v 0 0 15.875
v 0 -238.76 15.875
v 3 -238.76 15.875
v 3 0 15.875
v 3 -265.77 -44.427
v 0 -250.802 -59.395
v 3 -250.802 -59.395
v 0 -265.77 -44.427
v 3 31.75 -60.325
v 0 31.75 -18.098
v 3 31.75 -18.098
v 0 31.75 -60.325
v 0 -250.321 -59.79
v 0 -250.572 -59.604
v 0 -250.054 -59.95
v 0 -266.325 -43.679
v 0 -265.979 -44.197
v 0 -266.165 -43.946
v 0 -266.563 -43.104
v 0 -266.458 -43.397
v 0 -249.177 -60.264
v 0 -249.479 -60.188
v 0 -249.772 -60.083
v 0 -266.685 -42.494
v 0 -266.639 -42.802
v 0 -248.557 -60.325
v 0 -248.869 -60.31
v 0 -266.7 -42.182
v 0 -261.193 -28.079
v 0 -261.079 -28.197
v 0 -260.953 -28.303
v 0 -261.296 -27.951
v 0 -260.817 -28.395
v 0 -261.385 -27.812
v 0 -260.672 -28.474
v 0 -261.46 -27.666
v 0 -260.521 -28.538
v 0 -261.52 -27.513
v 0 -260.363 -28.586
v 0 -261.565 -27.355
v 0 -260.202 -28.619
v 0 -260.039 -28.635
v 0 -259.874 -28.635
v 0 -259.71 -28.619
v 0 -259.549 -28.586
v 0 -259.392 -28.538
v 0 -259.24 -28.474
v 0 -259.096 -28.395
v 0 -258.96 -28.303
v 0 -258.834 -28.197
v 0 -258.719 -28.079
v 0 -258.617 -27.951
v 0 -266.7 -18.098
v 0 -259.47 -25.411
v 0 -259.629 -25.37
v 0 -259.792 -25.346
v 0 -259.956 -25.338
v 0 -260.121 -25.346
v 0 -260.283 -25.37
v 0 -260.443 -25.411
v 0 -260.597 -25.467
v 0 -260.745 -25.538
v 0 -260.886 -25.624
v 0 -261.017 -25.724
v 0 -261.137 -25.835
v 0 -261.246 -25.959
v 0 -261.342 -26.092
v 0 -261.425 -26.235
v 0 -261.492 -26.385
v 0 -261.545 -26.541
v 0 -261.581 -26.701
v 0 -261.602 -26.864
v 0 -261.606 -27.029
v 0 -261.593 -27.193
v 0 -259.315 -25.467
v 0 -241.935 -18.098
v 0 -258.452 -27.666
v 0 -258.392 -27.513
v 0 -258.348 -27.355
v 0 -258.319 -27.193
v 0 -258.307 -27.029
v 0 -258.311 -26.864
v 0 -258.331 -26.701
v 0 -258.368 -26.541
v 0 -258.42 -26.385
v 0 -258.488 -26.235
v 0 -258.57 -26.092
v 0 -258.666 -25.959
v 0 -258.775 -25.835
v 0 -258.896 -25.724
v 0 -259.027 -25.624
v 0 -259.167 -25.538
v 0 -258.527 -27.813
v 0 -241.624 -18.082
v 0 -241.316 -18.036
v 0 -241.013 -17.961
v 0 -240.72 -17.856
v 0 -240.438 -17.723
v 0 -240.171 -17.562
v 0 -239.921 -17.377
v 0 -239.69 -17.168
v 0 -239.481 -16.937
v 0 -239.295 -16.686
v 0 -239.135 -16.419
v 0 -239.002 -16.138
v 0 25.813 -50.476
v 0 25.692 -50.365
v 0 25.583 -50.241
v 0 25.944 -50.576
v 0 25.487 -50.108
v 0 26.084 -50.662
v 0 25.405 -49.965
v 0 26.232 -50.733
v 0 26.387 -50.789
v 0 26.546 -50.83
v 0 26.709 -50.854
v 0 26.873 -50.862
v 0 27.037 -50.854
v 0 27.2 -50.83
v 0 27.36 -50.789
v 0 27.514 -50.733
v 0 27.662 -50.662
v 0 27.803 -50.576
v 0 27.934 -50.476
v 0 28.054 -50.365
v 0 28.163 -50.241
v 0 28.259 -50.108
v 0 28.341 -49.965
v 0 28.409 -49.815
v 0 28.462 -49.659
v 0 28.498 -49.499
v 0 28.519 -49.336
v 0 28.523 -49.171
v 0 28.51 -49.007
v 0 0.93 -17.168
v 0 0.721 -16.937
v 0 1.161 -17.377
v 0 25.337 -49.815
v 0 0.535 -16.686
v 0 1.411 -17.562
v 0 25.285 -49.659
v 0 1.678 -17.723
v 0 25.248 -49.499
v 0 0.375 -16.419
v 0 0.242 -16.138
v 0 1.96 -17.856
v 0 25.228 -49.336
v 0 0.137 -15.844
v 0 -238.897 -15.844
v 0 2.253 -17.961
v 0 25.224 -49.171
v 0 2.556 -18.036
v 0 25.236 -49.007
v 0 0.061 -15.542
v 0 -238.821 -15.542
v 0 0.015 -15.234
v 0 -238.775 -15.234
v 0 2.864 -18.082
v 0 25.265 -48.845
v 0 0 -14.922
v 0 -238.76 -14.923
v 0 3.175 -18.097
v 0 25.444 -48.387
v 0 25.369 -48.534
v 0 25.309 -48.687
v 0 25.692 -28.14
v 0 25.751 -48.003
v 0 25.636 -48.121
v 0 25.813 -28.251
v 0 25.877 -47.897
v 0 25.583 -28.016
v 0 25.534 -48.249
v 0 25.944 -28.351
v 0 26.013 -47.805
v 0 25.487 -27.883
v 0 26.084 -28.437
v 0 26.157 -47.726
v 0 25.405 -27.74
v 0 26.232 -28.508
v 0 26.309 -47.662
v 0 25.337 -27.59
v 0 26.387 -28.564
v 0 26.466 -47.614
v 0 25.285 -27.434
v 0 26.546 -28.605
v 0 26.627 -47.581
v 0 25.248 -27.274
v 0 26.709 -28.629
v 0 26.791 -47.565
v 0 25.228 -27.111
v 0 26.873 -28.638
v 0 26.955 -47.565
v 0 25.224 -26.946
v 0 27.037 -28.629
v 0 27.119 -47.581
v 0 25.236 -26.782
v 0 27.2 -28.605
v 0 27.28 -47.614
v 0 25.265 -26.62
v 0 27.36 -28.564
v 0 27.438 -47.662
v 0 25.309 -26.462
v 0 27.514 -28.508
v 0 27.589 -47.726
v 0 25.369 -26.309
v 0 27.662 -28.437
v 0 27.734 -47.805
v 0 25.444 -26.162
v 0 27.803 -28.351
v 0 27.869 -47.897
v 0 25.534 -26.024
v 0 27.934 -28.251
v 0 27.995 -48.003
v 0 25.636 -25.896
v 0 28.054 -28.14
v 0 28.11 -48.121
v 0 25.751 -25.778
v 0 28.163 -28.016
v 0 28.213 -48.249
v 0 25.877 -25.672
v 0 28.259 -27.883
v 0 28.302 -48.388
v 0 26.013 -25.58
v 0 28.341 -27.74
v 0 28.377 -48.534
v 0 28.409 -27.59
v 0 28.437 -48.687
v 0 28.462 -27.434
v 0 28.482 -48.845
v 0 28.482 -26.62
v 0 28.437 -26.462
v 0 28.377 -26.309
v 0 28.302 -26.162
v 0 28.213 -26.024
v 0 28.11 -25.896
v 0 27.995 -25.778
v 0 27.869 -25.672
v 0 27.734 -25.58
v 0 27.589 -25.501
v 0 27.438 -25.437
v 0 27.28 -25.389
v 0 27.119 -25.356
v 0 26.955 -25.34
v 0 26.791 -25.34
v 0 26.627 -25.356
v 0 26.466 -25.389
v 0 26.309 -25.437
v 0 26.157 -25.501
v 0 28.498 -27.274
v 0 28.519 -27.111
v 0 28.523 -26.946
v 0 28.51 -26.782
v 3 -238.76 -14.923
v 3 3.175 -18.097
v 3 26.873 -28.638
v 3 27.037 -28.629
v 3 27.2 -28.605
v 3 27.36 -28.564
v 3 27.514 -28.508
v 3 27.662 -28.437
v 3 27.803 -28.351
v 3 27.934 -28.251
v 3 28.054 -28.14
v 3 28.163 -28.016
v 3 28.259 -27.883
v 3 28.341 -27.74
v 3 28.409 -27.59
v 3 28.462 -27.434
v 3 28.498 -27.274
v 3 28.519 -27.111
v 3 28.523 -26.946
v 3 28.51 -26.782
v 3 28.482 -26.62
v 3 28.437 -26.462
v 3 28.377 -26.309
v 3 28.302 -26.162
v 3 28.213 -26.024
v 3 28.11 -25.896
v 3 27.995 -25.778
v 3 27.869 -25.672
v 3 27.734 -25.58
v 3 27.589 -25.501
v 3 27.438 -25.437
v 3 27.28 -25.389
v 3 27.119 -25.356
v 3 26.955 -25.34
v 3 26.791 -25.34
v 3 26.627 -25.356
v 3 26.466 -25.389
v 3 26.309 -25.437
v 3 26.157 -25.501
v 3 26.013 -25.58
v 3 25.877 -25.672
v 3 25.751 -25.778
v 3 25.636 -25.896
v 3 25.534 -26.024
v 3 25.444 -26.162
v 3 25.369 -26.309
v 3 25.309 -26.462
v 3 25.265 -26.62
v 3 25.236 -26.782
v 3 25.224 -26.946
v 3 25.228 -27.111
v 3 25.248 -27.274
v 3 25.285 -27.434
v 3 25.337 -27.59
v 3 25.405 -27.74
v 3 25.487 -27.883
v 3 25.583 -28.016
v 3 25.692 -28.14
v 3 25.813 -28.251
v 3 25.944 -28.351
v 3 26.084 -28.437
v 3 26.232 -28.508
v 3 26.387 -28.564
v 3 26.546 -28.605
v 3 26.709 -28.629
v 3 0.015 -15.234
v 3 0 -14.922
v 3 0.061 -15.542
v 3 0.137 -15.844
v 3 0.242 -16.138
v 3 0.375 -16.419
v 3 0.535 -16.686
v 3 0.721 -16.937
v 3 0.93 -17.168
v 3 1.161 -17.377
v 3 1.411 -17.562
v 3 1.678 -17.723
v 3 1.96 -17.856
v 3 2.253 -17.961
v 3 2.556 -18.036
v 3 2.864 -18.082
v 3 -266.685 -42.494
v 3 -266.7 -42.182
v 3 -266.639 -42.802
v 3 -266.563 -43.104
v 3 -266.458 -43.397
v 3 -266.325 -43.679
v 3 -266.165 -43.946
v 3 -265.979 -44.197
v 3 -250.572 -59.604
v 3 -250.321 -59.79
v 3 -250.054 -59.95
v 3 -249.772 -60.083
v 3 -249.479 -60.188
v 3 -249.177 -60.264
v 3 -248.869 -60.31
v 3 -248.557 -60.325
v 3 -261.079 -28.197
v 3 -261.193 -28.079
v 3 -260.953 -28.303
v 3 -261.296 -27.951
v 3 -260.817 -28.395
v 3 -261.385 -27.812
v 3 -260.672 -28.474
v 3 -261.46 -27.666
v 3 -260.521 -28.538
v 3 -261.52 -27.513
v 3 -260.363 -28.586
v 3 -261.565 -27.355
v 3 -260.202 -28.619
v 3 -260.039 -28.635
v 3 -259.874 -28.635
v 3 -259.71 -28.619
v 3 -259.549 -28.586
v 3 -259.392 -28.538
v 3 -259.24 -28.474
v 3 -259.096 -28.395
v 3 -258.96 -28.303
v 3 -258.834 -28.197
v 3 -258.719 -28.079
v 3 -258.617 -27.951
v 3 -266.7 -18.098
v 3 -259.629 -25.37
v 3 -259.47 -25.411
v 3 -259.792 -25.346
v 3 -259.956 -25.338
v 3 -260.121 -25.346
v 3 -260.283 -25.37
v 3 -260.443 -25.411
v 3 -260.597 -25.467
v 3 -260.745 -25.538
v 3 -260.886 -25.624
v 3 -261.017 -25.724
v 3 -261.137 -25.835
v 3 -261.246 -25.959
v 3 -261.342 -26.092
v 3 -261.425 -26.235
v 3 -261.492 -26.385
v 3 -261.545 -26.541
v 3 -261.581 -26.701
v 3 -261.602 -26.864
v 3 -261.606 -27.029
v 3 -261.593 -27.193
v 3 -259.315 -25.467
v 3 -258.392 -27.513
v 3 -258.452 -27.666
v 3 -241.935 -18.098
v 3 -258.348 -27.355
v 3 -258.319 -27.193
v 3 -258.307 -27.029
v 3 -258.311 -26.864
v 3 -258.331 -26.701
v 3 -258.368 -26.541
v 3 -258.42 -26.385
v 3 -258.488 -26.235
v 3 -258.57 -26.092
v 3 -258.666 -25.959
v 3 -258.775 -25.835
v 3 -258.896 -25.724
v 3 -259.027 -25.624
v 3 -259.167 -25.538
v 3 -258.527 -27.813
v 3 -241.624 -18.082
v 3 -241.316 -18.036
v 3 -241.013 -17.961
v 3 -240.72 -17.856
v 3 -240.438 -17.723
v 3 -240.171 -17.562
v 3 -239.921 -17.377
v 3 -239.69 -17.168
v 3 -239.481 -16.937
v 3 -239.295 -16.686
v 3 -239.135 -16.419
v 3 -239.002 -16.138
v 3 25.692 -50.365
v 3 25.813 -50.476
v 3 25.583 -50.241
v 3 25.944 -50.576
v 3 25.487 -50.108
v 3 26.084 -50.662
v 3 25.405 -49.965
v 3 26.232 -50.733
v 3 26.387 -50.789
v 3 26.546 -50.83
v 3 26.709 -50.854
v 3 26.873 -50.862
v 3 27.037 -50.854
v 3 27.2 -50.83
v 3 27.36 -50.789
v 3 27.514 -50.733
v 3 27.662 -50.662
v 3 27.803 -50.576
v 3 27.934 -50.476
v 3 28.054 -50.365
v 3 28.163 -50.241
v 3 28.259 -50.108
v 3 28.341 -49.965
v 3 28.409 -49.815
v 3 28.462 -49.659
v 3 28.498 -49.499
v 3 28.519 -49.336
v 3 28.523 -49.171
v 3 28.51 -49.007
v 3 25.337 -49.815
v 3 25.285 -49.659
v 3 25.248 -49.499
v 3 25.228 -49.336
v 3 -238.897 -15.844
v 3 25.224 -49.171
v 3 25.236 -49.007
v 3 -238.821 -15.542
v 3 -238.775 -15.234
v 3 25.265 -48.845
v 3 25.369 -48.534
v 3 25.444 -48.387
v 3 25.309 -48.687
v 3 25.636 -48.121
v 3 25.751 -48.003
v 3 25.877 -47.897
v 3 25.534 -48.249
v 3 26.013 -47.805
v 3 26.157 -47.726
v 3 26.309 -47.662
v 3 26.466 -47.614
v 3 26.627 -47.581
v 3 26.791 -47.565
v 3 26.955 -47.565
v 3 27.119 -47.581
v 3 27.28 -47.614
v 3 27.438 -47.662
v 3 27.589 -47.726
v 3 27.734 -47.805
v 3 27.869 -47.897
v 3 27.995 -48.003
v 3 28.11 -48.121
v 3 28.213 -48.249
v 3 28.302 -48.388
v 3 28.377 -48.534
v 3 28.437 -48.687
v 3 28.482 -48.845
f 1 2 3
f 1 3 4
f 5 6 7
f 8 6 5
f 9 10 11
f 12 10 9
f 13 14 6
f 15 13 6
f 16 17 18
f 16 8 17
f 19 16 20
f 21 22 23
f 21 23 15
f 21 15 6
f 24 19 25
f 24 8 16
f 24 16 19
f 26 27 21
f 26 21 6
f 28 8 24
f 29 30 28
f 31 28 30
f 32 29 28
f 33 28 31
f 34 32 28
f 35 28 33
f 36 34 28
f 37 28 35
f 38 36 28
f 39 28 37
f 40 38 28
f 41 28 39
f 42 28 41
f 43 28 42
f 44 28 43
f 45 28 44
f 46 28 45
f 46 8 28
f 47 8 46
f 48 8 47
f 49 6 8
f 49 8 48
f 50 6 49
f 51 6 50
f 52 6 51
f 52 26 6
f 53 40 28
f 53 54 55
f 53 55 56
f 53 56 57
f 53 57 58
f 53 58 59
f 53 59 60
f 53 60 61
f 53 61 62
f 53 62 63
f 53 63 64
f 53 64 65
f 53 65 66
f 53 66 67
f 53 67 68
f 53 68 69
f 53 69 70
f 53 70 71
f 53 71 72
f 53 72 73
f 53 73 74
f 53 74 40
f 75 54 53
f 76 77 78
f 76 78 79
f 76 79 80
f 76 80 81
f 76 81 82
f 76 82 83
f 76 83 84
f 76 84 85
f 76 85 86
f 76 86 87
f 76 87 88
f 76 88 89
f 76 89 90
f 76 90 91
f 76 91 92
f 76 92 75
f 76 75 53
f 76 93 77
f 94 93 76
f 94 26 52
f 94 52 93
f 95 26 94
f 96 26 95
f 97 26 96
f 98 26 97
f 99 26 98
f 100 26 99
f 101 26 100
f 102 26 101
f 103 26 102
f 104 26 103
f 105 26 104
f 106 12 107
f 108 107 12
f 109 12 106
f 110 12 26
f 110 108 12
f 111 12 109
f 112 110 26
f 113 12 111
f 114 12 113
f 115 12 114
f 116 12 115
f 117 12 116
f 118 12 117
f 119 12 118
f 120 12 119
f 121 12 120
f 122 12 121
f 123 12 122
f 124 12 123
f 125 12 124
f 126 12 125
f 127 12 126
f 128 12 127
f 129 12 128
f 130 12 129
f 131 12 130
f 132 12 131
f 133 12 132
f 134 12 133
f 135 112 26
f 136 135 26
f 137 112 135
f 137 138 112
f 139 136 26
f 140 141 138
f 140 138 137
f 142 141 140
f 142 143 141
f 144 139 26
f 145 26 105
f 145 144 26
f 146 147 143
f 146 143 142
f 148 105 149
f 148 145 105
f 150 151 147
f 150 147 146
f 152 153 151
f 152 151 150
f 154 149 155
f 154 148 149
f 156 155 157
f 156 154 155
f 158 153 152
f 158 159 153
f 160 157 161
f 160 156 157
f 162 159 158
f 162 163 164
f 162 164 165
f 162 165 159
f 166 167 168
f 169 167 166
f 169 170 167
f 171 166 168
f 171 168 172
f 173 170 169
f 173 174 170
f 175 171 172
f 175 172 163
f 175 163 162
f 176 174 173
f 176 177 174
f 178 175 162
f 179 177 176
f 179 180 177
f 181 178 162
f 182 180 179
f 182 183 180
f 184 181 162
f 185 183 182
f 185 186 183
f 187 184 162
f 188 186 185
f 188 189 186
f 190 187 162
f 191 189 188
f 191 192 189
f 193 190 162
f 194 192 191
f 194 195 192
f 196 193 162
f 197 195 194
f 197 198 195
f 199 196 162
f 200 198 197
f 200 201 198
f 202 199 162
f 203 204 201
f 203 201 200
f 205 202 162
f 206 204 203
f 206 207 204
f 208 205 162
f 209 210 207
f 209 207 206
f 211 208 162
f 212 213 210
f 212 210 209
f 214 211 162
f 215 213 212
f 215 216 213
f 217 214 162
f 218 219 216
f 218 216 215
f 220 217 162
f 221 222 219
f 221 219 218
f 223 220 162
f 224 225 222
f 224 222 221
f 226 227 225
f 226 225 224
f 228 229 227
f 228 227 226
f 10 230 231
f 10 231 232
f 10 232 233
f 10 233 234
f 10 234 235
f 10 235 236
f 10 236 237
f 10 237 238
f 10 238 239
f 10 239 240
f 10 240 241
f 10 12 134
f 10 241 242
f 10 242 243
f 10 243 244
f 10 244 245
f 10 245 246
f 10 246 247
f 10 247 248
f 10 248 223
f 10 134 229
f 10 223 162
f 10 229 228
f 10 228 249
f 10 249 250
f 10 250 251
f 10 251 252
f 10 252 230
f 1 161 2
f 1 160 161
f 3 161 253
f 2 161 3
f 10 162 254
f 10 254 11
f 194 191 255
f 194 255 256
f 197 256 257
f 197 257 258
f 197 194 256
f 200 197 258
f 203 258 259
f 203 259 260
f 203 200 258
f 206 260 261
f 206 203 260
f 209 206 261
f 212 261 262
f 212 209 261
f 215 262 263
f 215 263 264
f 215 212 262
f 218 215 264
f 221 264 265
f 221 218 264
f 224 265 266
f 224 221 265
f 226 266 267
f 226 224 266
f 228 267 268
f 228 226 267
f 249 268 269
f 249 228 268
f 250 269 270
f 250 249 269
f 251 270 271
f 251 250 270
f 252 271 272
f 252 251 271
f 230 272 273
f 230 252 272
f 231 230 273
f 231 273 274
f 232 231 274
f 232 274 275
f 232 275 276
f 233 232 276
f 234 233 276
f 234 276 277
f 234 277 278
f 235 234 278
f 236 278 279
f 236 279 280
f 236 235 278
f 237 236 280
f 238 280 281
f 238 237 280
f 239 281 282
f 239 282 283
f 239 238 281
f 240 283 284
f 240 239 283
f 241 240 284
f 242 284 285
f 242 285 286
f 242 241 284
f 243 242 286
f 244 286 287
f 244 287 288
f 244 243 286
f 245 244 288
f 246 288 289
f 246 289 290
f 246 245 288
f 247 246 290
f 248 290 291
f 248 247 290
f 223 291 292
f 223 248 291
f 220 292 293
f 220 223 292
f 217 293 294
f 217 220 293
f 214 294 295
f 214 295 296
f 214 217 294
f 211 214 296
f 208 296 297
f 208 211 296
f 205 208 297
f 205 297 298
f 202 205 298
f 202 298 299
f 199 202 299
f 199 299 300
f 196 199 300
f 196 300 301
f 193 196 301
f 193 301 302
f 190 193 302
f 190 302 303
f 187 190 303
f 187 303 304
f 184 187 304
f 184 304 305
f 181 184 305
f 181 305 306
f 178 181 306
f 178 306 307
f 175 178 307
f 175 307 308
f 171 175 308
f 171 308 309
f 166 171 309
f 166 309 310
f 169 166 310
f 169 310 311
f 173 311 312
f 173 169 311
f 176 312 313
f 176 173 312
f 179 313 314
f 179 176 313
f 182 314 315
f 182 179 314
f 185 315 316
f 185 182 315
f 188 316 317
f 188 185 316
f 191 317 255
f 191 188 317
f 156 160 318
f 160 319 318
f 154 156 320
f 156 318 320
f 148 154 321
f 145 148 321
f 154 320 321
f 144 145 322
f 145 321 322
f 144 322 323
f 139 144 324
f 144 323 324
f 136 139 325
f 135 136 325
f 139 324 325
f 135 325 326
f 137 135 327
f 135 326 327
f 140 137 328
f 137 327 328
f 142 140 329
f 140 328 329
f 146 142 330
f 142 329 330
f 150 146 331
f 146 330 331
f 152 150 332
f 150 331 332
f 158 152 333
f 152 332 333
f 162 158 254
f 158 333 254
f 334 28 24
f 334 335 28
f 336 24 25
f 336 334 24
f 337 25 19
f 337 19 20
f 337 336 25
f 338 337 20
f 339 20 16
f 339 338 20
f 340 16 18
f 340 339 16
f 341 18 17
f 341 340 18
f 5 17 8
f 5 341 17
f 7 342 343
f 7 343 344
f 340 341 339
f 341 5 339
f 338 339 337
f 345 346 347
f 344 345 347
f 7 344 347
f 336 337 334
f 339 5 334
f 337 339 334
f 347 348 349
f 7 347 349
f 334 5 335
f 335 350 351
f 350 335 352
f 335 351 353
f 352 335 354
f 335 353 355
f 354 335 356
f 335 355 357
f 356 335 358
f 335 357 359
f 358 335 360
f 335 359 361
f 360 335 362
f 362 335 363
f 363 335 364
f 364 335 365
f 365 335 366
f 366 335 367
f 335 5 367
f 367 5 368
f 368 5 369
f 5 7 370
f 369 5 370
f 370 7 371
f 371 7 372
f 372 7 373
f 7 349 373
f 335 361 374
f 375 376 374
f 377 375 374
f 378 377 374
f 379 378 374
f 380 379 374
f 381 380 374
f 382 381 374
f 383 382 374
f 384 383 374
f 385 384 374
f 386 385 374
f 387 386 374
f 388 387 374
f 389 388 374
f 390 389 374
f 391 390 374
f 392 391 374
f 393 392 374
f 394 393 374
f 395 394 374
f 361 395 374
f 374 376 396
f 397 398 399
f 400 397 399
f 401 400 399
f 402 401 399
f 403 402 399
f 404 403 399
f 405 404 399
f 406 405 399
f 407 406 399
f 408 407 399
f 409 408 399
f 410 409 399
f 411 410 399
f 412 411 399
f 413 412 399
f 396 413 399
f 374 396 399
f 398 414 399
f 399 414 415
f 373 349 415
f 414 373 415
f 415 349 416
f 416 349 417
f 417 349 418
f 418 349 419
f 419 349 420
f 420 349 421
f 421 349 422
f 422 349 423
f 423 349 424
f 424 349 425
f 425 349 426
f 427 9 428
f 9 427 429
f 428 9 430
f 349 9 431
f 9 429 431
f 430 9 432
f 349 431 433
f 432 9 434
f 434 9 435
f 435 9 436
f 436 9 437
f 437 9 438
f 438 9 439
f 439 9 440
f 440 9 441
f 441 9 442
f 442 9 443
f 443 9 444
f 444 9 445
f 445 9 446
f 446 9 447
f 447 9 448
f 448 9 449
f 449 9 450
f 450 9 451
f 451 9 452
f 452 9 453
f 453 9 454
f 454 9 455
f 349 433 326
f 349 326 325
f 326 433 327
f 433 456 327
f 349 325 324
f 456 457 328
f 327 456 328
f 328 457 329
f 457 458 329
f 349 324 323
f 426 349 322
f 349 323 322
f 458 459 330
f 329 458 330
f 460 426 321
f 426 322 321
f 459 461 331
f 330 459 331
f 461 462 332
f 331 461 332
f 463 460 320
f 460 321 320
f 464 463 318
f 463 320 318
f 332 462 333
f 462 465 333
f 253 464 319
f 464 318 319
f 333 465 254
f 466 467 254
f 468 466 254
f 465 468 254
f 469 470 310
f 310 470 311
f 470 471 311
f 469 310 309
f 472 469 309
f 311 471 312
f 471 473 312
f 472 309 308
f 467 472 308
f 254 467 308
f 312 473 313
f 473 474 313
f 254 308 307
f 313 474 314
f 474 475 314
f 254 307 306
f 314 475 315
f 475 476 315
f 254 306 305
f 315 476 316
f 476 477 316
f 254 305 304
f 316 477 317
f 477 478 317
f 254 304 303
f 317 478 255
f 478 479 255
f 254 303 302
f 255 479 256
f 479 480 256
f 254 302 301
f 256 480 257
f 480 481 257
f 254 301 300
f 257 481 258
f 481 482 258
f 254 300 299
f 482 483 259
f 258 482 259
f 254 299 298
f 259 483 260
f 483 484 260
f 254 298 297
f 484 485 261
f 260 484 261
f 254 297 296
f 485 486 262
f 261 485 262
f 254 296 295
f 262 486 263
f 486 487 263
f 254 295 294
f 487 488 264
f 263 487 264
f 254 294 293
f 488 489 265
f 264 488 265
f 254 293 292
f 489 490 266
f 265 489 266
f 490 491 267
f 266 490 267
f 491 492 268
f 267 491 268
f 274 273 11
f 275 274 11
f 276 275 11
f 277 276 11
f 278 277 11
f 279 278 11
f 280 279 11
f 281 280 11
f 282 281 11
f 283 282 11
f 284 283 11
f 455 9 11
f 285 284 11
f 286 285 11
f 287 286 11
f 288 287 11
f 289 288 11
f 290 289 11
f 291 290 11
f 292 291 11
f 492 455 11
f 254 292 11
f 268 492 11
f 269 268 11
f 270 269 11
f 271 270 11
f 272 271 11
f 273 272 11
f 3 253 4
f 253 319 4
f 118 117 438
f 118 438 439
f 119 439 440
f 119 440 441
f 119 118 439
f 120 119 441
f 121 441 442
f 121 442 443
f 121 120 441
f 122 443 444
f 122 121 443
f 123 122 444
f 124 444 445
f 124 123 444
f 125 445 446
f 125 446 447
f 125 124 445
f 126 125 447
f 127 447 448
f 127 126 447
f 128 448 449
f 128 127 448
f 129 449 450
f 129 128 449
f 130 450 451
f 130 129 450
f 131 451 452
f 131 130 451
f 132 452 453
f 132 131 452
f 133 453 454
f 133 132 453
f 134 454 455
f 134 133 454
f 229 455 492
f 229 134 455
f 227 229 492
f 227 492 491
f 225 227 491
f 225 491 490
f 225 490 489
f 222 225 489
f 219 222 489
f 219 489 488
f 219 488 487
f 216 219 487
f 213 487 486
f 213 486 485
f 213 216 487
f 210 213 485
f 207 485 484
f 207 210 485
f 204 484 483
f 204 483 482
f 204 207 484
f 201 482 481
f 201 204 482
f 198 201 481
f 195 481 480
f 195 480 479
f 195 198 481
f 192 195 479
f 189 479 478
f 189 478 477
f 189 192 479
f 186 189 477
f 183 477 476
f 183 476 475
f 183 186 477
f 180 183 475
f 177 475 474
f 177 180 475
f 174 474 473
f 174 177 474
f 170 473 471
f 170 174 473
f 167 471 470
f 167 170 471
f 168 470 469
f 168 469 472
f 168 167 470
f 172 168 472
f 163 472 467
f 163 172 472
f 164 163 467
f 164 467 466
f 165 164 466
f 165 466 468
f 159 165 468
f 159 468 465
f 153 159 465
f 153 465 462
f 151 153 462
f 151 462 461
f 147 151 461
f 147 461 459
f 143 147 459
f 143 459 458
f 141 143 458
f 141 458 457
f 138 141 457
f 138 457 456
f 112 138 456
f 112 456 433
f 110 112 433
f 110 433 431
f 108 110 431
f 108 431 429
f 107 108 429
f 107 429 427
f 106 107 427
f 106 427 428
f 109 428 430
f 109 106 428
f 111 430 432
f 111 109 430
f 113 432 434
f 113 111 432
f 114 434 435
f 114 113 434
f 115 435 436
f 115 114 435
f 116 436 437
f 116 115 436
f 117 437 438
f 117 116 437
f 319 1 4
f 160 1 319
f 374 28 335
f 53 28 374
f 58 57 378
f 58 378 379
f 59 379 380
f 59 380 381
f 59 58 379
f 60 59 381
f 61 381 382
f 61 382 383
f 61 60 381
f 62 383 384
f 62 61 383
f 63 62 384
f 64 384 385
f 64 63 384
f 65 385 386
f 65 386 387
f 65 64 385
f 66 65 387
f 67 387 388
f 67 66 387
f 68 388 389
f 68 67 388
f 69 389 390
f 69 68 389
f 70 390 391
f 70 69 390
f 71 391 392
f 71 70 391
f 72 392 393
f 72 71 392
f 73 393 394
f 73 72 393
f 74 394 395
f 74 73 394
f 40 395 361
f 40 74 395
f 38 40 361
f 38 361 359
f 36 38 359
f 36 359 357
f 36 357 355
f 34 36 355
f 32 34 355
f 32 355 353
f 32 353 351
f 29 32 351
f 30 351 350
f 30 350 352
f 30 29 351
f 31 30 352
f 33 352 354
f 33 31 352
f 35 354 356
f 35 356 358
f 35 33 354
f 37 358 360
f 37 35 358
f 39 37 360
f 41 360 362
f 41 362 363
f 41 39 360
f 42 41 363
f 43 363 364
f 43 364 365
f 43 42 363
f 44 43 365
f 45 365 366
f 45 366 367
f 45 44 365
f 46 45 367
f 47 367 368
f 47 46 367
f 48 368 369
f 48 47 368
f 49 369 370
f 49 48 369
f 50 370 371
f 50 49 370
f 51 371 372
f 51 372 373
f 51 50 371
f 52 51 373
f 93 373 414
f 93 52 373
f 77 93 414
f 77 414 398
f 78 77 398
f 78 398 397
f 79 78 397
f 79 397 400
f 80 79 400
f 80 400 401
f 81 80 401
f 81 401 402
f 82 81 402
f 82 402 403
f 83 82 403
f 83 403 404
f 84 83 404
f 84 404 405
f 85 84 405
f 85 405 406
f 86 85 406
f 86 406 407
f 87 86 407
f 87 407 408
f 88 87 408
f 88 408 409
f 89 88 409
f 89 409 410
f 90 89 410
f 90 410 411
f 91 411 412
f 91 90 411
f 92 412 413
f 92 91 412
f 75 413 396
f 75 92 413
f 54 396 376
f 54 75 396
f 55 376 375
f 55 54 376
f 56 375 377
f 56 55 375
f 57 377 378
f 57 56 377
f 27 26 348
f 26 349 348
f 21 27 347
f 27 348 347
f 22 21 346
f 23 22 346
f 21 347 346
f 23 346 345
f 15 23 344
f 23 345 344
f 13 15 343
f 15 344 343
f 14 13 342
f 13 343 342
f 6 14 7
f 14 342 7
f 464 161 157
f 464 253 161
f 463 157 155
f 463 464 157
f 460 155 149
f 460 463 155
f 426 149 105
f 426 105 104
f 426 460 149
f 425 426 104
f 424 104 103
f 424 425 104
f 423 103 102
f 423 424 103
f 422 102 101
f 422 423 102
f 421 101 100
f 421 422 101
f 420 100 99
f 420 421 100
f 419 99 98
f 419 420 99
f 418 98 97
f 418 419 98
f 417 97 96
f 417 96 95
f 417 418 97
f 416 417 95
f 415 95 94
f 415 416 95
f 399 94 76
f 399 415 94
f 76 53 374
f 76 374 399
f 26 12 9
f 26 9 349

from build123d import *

# Parameters (mm, degrees)
SKETCH1_R           = 1.65
BOSS_EXTRUDE1_DEPTH = 3
FILLET1_R           = 3.175


with BuildPart() as part:
    # Sketch1 → Boss-Extrude1 (new body)
    with BuildSketch(Plane(origin=(0, 0, 0), x_dir=(0, 0, -1), z_dir=(1, 0, 0))):
        Polygon((-15.875, 0), (18.0975, 0), (18.0975, 31.75), (60.325, 31.75), (60.325, -249.8725), (43.4975, -266.7), (18.0975, -266.7), (18.0975, -238.76), (-15.875, -238.76), align=None)
        with Locations((26.9875, 26.8732)):
            Circle(SKETCH1_R, mode=Mode.SUBTRACT)
        with Locations((49.2125, 26.8732)):
            Circle(SKETCH1_R, mode=Mode.SUBTRACT)
        with Locations(Location((26.9875, -259.9563, 0), (0, 0, 180))):
            Circle(SKETCH1_R, mode=Mode.SUBTRACT)
    extrude(amount=BOSS_EXTRUDE1_DEPTH)

    # Fillet1
    fillet1_edges = [part.edges().sort_by_distance(p)[0] for p in [
        (1.5, 0, -18.0975),
        (1.5, -249.8725, -60.325),
        (1.5, -266.7, -43.4975),
        (1.5, -238.76, -18.0975),
    ]]
    fillet(fillet1_edges, radius=FILLET1_R)


solid = part.part
